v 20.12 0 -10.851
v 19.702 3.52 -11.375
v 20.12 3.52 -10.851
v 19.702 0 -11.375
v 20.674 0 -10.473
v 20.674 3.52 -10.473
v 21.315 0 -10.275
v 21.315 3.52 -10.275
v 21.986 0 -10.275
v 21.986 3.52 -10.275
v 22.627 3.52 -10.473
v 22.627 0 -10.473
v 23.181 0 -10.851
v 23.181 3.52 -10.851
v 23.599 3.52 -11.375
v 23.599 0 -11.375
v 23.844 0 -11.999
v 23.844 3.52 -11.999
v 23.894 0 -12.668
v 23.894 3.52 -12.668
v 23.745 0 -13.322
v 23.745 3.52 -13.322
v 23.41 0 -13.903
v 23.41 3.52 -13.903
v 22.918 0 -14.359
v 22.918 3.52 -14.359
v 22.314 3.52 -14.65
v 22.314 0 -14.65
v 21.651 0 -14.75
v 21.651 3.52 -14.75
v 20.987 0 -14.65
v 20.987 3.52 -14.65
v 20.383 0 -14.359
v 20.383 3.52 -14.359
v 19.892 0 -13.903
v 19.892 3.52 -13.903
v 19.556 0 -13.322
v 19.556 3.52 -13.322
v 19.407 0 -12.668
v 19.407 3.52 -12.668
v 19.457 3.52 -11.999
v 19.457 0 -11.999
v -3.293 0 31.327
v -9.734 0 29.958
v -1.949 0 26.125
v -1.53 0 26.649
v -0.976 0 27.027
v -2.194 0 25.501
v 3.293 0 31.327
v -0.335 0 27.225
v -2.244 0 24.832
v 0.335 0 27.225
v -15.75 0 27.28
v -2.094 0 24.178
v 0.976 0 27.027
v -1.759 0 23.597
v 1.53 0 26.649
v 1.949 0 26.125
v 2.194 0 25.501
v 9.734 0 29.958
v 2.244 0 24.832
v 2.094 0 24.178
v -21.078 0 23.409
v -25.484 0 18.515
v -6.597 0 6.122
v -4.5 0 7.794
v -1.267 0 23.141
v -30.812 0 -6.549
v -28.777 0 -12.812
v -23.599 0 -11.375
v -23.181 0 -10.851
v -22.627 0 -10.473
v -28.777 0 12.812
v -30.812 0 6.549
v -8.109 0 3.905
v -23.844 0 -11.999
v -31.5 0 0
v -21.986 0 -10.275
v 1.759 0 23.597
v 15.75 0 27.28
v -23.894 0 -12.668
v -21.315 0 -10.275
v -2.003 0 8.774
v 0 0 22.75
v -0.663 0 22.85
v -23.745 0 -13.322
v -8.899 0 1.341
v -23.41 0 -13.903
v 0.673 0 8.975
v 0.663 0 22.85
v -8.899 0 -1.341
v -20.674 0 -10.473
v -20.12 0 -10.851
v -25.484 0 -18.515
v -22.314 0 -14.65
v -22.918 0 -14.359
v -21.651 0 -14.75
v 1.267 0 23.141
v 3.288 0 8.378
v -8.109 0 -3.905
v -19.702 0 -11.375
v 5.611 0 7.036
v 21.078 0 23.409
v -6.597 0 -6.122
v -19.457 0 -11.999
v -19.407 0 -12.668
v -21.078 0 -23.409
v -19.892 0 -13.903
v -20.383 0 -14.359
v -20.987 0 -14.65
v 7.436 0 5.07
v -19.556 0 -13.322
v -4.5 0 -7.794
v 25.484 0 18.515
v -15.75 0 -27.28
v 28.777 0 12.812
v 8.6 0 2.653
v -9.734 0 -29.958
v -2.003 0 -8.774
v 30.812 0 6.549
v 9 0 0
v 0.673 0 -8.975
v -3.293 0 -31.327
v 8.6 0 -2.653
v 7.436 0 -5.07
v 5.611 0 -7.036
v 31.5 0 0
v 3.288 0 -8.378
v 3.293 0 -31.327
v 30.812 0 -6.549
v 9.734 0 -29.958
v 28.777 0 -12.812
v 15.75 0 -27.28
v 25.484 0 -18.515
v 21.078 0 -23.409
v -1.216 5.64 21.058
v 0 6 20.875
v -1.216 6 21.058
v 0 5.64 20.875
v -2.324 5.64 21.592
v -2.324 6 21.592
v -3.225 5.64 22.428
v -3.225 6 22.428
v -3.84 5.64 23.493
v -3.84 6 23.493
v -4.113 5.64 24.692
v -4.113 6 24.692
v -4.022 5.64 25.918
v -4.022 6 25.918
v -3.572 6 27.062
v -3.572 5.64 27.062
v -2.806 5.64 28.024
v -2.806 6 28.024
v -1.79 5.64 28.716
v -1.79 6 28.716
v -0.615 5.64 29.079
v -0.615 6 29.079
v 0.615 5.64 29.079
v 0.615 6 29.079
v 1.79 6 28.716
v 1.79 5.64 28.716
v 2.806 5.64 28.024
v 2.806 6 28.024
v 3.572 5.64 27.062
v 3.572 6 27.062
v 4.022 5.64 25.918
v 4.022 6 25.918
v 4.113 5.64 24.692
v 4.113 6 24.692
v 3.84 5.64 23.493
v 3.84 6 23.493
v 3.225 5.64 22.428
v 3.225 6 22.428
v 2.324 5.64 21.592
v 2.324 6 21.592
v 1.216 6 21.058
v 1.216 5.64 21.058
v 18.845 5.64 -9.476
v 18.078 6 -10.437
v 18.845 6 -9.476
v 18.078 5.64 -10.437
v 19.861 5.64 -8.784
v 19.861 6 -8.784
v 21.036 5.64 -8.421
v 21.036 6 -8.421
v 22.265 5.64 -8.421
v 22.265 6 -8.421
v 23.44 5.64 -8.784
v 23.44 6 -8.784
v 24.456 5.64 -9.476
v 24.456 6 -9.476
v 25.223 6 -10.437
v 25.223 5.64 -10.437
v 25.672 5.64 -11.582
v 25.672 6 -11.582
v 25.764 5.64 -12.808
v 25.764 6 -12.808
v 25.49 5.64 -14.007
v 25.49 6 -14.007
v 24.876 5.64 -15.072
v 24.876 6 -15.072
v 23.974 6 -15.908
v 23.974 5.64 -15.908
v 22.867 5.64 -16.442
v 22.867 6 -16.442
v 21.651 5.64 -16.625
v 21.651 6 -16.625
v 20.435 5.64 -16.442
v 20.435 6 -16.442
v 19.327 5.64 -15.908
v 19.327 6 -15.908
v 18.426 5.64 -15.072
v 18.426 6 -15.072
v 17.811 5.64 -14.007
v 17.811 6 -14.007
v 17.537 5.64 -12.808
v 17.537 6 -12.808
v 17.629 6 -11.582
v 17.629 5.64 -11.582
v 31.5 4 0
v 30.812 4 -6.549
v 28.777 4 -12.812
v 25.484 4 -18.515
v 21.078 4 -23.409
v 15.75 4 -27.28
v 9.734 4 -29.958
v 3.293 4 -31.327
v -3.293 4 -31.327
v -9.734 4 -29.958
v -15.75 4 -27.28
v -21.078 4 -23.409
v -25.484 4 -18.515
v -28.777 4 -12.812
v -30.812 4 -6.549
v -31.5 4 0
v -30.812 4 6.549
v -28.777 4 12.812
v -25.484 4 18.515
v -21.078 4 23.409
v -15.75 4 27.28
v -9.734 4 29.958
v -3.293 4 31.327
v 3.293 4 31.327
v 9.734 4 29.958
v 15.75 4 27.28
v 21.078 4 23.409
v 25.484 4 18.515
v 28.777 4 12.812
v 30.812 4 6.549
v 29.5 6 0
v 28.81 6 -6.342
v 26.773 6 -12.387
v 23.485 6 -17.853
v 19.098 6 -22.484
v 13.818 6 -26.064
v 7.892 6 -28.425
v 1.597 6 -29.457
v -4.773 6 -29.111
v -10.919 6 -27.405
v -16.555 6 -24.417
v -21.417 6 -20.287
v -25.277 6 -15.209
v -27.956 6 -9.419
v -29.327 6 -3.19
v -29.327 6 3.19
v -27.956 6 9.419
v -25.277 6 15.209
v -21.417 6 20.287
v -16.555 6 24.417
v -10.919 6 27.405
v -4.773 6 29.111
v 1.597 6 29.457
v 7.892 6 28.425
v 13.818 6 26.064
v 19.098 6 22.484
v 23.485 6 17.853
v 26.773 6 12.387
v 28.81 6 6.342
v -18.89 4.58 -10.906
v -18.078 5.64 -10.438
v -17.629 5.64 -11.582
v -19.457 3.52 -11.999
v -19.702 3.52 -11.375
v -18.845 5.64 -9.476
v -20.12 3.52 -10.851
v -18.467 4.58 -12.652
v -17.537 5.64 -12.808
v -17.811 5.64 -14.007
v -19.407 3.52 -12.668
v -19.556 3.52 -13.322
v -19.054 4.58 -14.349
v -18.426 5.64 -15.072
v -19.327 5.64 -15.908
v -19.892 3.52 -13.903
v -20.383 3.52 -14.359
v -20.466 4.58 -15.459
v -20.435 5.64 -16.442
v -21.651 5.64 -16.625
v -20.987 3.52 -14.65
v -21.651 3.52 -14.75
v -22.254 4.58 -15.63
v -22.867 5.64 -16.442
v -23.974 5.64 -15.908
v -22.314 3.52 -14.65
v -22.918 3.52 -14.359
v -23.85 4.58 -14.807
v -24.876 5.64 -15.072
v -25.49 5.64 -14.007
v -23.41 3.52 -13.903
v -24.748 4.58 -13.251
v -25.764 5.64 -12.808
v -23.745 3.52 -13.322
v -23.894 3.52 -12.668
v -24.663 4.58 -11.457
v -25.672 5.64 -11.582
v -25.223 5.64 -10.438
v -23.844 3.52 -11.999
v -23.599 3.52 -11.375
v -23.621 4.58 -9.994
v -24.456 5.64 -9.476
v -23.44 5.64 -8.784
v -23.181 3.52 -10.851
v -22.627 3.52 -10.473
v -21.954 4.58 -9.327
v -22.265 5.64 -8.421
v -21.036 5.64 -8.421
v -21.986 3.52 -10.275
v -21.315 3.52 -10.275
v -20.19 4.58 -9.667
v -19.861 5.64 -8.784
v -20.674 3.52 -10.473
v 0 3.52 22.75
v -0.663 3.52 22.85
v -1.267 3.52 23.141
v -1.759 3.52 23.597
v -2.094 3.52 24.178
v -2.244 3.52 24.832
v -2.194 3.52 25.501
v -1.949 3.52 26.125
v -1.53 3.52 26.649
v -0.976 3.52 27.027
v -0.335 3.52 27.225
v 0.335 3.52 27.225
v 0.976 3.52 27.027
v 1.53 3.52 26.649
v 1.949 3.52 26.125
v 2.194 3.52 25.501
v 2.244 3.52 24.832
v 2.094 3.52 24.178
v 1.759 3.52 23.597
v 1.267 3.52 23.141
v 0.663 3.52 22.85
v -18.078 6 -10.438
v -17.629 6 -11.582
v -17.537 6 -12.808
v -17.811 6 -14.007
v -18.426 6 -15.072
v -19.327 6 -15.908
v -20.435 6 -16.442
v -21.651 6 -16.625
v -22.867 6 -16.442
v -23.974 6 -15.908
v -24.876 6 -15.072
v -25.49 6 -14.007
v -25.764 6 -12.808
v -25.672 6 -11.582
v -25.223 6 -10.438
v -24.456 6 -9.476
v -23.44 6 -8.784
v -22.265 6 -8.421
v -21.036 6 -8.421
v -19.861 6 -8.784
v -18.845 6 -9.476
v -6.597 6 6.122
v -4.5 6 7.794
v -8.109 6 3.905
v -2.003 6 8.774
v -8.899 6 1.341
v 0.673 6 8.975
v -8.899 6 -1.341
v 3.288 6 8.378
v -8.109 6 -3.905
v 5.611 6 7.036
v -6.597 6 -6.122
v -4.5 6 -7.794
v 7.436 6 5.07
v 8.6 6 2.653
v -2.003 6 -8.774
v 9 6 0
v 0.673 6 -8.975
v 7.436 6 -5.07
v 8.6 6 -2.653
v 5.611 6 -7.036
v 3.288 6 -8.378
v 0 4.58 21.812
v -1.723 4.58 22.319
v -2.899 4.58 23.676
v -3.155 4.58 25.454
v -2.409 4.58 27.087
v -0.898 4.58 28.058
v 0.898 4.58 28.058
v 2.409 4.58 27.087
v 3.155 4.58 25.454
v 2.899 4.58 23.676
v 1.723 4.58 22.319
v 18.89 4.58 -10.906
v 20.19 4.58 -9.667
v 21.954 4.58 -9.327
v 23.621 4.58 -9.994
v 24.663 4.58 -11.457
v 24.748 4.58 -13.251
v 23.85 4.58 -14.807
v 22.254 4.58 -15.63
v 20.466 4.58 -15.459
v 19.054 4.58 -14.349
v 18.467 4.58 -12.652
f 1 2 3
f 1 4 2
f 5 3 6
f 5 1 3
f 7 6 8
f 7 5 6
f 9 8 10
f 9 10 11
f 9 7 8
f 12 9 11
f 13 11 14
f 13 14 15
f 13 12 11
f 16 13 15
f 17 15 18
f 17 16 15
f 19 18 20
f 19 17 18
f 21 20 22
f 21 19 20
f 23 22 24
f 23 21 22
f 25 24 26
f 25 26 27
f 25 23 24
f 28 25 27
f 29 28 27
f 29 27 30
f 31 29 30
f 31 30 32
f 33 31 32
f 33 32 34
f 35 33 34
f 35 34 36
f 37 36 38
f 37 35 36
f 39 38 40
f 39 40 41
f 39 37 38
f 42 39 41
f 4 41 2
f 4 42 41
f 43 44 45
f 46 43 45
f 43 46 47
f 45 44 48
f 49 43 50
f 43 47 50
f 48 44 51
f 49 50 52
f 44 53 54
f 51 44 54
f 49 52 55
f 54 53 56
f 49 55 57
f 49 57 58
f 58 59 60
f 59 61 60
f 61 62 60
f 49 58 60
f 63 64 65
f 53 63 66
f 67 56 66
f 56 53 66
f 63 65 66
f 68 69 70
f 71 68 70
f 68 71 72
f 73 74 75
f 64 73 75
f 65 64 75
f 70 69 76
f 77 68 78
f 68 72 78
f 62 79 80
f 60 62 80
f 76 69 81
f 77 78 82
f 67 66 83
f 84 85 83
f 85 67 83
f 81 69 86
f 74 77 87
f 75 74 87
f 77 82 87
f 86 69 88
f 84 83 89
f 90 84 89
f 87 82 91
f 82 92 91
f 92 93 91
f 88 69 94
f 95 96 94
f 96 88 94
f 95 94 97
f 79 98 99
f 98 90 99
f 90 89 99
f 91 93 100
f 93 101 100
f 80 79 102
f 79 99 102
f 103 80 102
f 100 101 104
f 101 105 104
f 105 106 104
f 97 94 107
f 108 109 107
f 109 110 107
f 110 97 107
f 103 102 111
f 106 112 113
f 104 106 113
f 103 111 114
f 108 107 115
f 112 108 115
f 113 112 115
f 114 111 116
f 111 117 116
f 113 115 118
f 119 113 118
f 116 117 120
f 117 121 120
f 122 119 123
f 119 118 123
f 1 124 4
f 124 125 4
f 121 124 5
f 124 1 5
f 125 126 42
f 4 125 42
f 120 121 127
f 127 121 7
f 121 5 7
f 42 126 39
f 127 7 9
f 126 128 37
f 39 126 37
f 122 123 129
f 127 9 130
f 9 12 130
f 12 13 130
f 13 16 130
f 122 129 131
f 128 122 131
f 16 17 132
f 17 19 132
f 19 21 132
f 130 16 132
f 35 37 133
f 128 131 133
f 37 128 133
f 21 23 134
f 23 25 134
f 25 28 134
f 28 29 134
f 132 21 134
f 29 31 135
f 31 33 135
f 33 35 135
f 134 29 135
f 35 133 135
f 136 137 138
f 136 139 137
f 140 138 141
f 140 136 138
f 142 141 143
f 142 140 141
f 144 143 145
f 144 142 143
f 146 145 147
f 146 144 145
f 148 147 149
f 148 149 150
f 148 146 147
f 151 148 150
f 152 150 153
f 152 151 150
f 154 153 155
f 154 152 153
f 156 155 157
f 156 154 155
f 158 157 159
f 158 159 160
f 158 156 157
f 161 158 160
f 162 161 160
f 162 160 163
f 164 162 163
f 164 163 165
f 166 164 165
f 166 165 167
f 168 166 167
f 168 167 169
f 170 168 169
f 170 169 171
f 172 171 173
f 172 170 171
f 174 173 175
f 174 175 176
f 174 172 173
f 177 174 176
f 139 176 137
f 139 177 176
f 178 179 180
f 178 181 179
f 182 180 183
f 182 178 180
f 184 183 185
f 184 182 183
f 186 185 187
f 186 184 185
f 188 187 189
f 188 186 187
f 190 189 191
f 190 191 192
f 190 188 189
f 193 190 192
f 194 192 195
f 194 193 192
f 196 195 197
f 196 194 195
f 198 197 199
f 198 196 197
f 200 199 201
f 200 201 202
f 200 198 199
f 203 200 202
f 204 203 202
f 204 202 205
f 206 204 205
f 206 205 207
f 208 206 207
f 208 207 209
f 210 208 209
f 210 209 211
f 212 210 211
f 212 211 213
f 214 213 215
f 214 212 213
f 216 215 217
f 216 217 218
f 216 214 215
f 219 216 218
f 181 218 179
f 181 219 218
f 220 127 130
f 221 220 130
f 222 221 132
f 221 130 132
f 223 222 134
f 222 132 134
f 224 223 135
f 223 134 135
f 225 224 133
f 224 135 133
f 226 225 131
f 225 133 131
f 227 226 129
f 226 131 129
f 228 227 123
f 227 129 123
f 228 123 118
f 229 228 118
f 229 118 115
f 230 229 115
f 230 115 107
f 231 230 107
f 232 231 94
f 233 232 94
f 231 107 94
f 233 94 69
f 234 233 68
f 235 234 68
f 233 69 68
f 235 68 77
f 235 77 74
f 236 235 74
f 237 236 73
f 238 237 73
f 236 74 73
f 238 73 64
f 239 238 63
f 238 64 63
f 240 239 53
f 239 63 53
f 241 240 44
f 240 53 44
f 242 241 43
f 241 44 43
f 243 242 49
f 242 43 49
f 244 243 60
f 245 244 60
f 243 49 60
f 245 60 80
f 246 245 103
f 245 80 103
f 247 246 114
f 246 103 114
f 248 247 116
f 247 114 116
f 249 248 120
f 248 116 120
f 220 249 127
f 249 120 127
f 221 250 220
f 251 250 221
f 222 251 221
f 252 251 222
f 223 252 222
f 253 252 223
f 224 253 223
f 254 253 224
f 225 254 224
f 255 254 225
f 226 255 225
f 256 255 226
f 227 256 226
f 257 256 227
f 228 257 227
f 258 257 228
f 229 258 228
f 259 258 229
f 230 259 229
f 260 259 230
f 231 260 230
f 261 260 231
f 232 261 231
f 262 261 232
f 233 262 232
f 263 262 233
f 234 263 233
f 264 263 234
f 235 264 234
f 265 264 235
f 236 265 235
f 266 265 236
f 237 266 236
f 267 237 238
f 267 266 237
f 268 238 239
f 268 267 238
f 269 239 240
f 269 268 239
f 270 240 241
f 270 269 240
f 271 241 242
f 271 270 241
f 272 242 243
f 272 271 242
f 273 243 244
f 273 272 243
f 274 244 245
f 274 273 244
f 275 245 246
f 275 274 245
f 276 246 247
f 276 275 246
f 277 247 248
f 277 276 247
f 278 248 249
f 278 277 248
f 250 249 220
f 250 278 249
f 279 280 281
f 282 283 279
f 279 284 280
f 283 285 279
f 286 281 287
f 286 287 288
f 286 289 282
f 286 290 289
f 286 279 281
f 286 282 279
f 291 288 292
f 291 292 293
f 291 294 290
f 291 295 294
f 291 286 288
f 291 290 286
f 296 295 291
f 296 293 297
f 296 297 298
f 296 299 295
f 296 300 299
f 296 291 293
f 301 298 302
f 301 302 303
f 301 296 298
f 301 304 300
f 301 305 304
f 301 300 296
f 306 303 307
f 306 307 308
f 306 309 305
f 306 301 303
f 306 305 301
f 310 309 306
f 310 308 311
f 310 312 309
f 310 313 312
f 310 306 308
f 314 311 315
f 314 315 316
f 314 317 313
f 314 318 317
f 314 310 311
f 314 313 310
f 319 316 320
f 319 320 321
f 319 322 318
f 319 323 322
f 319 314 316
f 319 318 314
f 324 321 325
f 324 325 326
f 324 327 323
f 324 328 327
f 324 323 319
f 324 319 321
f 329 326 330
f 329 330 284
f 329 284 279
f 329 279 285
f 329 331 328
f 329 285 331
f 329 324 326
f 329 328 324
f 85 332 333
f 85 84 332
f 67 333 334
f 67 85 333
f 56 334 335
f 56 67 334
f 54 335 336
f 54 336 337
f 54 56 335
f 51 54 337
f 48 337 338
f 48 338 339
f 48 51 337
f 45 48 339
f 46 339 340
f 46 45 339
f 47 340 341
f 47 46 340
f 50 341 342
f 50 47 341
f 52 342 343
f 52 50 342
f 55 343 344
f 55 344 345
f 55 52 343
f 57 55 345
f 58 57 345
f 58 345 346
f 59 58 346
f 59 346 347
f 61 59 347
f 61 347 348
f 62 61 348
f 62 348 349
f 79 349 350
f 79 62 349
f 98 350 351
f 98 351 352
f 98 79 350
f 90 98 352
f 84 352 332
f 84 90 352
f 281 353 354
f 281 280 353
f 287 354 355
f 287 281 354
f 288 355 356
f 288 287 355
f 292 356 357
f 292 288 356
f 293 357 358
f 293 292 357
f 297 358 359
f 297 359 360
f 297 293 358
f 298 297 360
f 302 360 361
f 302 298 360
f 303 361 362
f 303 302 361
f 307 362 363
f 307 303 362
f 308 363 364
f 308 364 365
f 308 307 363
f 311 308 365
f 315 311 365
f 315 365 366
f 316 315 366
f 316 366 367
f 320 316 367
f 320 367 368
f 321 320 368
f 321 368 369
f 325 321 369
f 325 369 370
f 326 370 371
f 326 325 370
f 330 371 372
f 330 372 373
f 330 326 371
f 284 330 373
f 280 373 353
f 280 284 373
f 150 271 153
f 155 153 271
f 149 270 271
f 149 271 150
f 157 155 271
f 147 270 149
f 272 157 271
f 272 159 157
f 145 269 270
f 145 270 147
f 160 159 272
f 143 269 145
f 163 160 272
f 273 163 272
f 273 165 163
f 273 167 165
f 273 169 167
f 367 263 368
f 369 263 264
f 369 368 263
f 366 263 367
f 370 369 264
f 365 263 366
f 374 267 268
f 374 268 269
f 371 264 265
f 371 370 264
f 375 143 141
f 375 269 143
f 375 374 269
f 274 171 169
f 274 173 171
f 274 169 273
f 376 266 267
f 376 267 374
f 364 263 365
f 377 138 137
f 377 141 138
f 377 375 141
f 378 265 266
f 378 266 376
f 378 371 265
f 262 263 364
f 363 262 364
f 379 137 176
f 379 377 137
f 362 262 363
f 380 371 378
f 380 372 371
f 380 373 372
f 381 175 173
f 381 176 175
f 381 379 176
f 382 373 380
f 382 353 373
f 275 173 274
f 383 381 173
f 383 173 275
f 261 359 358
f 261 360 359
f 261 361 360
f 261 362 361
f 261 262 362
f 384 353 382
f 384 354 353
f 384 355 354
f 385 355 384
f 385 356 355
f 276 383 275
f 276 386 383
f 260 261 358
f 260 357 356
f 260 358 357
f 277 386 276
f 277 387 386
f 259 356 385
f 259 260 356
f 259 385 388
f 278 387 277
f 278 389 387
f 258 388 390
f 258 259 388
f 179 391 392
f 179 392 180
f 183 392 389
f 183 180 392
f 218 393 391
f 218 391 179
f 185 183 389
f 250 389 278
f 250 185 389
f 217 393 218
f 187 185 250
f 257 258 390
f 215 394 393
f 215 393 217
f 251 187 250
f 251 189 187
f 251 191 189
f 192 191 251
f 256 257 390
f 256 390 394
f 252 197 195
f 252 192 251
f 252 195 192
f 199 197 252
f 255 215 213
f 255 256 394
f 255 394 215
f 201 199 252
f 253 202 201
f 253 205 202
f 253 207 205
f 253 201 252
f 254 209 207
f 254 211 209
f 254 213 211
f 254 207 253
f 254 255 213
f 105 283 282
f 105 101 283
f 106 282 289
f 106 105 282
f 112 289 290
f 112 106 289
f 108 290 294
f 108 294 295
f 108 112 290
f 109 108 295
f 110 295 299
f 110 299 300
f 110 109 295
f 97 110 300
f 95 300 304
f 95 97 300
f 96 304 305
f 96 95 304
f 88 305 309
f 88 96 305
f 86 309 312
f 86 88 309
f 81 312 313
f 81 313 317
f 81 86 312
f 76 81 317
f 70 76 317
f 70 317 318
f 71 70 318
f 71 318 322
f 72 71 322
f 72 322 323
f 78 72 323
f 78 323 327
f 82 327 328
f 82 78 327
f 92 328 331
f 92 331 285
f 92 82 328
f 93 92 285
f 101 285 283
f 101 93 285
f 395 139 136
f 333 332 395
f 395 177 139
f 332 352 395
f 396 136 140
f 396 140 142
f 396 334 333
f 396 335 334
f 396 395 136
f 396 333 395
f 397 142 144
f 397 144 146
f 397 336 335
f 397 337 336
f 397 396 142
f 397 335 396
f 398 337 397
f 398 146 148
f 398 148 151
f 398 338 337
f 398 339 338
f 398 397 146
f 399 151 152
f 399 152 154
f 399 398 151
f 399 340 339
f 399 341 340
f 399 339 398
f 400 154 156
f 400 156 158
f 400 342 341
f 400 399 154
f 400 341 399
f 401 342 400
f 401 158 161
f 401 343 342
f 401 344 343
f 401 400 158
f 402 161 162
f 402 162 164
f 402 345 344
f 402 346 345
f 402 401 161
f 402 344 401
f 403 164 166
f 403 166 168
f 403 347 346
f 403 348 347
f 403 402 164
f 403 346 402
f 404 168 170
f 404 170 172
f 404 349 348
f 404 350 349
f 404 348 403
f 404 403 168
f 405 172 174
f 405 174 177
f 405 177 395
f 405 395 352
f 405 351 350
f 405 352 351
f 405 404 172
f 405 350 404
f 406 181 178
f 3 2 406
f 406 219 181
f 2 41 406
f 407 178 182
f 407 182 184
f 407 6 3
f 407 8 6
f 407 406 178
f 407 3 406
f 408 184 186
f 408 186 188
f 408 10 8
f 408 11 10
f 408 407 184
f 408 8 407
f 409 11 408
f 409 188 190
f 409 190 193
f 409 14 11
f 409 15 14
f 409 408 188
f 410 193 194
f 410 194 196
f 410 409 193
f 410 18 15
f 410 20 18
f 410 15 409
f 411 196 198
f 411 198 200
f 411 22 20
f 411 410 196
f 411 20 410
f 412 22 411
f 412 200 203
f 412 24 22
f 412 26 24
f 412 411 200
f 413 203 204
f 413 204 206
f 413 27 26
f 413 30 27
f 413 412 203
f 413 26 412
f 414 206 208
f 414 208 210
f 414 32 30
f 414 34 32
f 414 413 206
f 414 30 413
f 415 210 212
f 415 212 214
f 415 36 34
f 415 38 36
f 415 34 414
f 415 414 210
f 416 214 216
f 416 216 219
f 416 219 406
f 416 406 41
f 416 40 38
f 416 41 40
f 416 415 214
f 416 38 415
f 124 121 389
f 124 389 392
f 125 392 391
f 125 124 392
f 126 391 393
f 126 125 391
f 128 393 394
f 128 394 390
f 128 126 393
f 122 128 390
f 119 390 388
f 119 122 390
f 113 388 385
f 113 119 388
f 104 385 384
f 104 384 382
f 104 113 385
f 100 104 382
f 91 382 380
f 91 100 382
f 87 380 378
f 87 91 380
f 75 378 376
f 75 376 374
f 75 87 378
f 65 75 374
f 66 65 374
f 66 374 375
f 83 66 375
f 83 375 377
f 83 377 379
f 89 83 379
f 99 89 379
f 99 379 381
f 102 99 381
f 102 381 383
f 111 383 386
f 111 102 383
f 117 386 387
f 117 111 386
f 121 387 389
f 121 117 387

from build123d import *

# Parameters (mm, degrees)
CROQUIS1_R              = 31.5
CROQUIS1_R_2            = 9
SALIENTE_EXTRUIR1_DEPTH = 6
CHAFL_N1_SIZE           = 2
MATRIZC1_COUNT          = 3


with BuildPart() as part:
    # Croquis1 → Saliente-Extruir1 (new body)
    with BuildSketch(Plane(origin=(0, 0, 0), x_dir=(1, 0, 0), z_dir=(0, 1, 0))):
        Circle(CROQUIS1_R)
        Circle(CROQUIS1_R_2, mode=Mode.SUBTRACT)
    extrude(amount=SALIENTE_EXTRUIR1_DEPTH)

    # Chaflán1
    chafl_n1_edges = [part.edges().sort_by_distance(p)[0] for p in [
        (-31.5, 6, 0),
    ]]
    chamfer(chafl_n1_edges, length=CHAFL_N1_SIZE)

    # Croquis2 → Cortar-Revolución1 (revolve, cut)
    with BuildSketch(Plane(origin=(0, 0, 0), x_dir=(0, 0, -1), z_dir=(1, 0, 0))):
        Polygon((-25, 0), (-25, 6), (-20.875, 6), (-20.875, 5.64), (-22.75, 3.52), (-22.75, 0), align=None)
    cortar_revoluci_n1 = revolve(axis=Axis((0, 0, 25), (0, 1, 0)), mode=Mode.SUBTRACT)

    # MatrizC1: Cortar-Revolución1 ×3 about axis
    matrizc1_axis = Axis((0, 0, 0), (0, 1, 0))
    for i in range(1, MATRIZC1_COUNT):
        add(cortar_revoluci_n1.rotate(matrizc1_axis, i * 360 / MATRIZC1_COUNT), mode=Mode.SUBTRACT)


solid = part.part
